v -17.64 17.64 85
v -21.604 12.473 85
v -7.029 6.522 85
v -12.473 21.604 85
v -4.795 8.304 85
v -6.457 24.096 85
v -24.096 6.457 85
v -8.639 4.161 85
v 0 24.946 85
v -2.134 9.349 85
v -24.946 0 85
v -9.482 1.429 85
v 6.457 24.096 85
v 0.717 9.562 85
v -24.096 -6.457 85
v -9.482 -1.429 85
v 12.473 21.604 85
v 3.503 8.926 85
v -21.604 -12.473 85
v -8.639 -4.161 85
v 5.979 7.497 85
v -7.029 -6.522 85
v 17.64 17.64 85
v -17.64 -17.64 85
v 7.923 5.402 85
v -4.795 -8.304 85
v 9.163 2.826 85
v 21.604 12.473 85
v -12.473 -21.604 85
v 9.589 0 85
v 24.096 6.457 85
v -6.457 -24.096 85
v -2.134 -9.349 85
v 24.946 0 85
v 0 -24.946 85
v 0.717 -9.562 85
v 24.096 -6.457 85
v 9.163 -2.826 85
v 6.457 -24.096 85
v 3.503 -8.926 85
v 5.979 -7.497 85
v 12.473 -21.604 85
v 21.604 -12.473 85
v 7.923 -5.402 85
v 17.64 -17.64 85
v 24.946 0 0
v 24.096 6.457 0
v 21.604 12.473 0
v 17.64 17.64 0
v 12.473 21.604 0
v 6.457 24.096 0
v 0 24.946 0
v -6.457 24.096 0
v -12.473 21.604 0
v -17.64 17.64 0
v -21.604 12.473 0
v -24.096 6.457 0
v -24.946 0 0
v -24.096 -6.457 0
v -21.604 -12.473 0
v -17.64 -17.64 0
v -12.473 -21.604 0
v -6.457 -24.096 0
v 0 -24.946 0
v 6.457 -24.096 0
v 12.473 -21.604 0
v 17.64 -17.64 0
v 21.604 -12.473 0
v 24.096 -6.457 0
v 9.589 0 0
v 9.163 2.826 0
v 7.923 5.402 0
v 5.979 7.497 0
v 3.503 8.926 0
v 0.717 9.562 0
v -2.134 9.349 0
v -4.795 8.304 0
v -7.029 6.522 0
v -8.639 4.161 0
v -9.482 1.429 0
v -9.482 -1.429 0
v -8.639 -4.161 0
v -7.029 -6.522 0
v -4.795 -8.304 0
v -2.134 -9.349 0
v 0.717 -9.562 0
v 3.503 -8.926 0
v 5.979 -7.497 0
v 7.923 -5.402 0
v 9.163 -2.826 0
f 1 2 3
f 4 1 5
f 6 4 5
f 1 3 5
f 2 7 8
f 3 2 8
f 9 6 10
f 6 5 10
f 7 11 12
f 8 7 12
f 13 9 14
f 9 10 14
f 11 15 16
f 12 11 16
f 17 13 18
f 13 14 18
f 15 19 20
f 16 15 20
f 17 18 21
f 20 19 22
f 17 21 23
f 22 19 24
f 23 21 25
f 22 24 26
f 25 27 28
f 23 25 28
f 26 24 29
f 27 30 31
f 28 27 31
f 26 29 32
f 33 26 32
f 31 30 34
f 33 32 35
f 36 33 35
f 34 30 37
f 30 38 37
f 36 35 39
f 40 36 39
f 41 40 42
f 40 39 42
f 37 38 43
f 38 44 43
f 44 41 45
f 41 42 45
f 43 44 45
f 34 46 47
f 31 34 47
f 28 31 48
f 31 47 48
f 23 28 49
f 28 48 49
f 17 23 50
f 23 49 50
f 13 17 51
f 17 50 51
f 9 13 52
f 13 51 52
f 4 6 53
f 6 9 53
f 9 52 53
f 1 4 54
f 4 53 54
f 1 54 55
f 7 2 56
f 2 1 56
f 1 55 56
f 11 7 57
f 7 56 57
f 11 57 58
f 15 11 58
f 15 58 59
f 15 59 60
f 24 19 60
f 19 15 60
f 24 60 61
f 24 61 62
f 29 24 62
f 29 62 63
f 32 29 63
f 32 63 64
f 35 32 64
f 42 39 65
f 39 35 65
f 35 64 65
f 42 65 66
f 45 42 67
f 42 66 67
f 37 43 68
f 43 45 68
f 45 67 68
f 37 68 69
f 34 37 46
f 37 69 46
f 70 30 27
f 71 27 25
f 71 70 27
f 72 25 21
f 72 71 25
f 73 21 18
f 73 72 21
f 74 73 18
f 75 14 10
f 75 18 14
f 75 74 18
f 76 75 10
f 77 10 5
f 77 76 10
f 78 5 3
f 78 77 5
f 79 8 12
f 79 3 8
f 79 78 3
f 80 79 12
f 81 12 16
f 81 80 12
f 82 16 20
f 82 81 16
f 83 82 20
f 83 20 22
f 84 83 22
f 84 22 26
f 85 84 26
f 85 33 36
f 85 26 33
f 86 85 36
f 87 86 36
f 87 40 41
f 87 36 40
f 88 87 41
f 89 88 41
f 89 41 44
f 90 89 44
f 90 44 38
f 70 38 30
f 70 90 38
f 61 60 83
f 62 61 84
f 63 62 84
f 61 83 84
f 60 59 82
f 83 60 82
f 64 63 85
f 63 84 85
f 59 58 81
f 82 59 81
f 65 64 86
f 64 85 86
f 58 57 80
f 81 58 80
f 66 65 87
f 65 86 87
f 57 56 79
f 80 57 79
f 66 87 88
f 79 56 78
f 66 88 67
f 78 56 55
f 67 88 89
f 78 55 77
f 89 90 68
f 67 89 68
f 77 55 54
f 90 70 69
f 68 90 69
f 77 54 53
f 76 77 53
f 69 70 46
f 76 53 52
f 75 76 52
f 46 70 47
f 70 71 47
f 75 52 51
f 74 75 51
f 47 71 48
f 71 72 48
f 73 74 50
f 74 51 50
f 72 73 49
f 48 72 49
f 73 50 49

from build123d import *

# Parameters (mm, degrees)
F0_R      = 24.946026
F1_DEPTH  = 75.1
F2_R      = 9.571884
F2_R_2    = 24.946026
F1_FACE_R = 24.946026
F3_DEPTH  = 85
F4_R      = 9.504861
F5_DEPTH  = 84.9
F6_R      = 9.521751
F7_DEPTH  = 84.7
F8_R      = 9.589017
F9_DEPTH  = 94.3


with BuildPart() as f1:
    # F0 (on Top) → F1 (new body)
    with BuildSketch(Plane.XY):
        Circle(F0_R)
    extrude(amount=F1_DEPTH)

    # F2 (on face) + F1_face (on face) → F3 (join)
    with BuildSketch(Plane(origin=(0, 0, 0), x_dir=(1, 0, 0), z_dir=(0, 0, -1))):
        Circle(F2_R)
        Circle(F2_R_2)
        Circle(F2_R, mode=Mode.SUBTRACT)
    with BuildSketch(Plane(origin=(0, 0, 0), x_dir=(1, 0, 0), z_dir=(0, 0, -1))):
        Circle(F1_FACE_R)
    extrude(amount=-F3_DEPTH)

    # F4 (on face) → F5 (join)
    with BuildSketch(Plane.XY.offset(85)):
        Circle(F4_R)
    extrude(amount=-F5_DEPTH)

    # F6 (on face) → F7 (join)
    with BuildSketch(Plane(origin=(0, 0, 0), x_dir=(1, 0, 0), z_dir=(0, 0, -1))):
        Circle(F6_R)
    extrude(amount=-F7_DEPTH)

    # F8 (on Top) → F9 (cut)
    with BuildSketch(Plane.XY):
        Circle(F8_R)
    extrude(amount=F9_DEPTH, mode=Mode.SUBTRACT)


solid = f1.part
